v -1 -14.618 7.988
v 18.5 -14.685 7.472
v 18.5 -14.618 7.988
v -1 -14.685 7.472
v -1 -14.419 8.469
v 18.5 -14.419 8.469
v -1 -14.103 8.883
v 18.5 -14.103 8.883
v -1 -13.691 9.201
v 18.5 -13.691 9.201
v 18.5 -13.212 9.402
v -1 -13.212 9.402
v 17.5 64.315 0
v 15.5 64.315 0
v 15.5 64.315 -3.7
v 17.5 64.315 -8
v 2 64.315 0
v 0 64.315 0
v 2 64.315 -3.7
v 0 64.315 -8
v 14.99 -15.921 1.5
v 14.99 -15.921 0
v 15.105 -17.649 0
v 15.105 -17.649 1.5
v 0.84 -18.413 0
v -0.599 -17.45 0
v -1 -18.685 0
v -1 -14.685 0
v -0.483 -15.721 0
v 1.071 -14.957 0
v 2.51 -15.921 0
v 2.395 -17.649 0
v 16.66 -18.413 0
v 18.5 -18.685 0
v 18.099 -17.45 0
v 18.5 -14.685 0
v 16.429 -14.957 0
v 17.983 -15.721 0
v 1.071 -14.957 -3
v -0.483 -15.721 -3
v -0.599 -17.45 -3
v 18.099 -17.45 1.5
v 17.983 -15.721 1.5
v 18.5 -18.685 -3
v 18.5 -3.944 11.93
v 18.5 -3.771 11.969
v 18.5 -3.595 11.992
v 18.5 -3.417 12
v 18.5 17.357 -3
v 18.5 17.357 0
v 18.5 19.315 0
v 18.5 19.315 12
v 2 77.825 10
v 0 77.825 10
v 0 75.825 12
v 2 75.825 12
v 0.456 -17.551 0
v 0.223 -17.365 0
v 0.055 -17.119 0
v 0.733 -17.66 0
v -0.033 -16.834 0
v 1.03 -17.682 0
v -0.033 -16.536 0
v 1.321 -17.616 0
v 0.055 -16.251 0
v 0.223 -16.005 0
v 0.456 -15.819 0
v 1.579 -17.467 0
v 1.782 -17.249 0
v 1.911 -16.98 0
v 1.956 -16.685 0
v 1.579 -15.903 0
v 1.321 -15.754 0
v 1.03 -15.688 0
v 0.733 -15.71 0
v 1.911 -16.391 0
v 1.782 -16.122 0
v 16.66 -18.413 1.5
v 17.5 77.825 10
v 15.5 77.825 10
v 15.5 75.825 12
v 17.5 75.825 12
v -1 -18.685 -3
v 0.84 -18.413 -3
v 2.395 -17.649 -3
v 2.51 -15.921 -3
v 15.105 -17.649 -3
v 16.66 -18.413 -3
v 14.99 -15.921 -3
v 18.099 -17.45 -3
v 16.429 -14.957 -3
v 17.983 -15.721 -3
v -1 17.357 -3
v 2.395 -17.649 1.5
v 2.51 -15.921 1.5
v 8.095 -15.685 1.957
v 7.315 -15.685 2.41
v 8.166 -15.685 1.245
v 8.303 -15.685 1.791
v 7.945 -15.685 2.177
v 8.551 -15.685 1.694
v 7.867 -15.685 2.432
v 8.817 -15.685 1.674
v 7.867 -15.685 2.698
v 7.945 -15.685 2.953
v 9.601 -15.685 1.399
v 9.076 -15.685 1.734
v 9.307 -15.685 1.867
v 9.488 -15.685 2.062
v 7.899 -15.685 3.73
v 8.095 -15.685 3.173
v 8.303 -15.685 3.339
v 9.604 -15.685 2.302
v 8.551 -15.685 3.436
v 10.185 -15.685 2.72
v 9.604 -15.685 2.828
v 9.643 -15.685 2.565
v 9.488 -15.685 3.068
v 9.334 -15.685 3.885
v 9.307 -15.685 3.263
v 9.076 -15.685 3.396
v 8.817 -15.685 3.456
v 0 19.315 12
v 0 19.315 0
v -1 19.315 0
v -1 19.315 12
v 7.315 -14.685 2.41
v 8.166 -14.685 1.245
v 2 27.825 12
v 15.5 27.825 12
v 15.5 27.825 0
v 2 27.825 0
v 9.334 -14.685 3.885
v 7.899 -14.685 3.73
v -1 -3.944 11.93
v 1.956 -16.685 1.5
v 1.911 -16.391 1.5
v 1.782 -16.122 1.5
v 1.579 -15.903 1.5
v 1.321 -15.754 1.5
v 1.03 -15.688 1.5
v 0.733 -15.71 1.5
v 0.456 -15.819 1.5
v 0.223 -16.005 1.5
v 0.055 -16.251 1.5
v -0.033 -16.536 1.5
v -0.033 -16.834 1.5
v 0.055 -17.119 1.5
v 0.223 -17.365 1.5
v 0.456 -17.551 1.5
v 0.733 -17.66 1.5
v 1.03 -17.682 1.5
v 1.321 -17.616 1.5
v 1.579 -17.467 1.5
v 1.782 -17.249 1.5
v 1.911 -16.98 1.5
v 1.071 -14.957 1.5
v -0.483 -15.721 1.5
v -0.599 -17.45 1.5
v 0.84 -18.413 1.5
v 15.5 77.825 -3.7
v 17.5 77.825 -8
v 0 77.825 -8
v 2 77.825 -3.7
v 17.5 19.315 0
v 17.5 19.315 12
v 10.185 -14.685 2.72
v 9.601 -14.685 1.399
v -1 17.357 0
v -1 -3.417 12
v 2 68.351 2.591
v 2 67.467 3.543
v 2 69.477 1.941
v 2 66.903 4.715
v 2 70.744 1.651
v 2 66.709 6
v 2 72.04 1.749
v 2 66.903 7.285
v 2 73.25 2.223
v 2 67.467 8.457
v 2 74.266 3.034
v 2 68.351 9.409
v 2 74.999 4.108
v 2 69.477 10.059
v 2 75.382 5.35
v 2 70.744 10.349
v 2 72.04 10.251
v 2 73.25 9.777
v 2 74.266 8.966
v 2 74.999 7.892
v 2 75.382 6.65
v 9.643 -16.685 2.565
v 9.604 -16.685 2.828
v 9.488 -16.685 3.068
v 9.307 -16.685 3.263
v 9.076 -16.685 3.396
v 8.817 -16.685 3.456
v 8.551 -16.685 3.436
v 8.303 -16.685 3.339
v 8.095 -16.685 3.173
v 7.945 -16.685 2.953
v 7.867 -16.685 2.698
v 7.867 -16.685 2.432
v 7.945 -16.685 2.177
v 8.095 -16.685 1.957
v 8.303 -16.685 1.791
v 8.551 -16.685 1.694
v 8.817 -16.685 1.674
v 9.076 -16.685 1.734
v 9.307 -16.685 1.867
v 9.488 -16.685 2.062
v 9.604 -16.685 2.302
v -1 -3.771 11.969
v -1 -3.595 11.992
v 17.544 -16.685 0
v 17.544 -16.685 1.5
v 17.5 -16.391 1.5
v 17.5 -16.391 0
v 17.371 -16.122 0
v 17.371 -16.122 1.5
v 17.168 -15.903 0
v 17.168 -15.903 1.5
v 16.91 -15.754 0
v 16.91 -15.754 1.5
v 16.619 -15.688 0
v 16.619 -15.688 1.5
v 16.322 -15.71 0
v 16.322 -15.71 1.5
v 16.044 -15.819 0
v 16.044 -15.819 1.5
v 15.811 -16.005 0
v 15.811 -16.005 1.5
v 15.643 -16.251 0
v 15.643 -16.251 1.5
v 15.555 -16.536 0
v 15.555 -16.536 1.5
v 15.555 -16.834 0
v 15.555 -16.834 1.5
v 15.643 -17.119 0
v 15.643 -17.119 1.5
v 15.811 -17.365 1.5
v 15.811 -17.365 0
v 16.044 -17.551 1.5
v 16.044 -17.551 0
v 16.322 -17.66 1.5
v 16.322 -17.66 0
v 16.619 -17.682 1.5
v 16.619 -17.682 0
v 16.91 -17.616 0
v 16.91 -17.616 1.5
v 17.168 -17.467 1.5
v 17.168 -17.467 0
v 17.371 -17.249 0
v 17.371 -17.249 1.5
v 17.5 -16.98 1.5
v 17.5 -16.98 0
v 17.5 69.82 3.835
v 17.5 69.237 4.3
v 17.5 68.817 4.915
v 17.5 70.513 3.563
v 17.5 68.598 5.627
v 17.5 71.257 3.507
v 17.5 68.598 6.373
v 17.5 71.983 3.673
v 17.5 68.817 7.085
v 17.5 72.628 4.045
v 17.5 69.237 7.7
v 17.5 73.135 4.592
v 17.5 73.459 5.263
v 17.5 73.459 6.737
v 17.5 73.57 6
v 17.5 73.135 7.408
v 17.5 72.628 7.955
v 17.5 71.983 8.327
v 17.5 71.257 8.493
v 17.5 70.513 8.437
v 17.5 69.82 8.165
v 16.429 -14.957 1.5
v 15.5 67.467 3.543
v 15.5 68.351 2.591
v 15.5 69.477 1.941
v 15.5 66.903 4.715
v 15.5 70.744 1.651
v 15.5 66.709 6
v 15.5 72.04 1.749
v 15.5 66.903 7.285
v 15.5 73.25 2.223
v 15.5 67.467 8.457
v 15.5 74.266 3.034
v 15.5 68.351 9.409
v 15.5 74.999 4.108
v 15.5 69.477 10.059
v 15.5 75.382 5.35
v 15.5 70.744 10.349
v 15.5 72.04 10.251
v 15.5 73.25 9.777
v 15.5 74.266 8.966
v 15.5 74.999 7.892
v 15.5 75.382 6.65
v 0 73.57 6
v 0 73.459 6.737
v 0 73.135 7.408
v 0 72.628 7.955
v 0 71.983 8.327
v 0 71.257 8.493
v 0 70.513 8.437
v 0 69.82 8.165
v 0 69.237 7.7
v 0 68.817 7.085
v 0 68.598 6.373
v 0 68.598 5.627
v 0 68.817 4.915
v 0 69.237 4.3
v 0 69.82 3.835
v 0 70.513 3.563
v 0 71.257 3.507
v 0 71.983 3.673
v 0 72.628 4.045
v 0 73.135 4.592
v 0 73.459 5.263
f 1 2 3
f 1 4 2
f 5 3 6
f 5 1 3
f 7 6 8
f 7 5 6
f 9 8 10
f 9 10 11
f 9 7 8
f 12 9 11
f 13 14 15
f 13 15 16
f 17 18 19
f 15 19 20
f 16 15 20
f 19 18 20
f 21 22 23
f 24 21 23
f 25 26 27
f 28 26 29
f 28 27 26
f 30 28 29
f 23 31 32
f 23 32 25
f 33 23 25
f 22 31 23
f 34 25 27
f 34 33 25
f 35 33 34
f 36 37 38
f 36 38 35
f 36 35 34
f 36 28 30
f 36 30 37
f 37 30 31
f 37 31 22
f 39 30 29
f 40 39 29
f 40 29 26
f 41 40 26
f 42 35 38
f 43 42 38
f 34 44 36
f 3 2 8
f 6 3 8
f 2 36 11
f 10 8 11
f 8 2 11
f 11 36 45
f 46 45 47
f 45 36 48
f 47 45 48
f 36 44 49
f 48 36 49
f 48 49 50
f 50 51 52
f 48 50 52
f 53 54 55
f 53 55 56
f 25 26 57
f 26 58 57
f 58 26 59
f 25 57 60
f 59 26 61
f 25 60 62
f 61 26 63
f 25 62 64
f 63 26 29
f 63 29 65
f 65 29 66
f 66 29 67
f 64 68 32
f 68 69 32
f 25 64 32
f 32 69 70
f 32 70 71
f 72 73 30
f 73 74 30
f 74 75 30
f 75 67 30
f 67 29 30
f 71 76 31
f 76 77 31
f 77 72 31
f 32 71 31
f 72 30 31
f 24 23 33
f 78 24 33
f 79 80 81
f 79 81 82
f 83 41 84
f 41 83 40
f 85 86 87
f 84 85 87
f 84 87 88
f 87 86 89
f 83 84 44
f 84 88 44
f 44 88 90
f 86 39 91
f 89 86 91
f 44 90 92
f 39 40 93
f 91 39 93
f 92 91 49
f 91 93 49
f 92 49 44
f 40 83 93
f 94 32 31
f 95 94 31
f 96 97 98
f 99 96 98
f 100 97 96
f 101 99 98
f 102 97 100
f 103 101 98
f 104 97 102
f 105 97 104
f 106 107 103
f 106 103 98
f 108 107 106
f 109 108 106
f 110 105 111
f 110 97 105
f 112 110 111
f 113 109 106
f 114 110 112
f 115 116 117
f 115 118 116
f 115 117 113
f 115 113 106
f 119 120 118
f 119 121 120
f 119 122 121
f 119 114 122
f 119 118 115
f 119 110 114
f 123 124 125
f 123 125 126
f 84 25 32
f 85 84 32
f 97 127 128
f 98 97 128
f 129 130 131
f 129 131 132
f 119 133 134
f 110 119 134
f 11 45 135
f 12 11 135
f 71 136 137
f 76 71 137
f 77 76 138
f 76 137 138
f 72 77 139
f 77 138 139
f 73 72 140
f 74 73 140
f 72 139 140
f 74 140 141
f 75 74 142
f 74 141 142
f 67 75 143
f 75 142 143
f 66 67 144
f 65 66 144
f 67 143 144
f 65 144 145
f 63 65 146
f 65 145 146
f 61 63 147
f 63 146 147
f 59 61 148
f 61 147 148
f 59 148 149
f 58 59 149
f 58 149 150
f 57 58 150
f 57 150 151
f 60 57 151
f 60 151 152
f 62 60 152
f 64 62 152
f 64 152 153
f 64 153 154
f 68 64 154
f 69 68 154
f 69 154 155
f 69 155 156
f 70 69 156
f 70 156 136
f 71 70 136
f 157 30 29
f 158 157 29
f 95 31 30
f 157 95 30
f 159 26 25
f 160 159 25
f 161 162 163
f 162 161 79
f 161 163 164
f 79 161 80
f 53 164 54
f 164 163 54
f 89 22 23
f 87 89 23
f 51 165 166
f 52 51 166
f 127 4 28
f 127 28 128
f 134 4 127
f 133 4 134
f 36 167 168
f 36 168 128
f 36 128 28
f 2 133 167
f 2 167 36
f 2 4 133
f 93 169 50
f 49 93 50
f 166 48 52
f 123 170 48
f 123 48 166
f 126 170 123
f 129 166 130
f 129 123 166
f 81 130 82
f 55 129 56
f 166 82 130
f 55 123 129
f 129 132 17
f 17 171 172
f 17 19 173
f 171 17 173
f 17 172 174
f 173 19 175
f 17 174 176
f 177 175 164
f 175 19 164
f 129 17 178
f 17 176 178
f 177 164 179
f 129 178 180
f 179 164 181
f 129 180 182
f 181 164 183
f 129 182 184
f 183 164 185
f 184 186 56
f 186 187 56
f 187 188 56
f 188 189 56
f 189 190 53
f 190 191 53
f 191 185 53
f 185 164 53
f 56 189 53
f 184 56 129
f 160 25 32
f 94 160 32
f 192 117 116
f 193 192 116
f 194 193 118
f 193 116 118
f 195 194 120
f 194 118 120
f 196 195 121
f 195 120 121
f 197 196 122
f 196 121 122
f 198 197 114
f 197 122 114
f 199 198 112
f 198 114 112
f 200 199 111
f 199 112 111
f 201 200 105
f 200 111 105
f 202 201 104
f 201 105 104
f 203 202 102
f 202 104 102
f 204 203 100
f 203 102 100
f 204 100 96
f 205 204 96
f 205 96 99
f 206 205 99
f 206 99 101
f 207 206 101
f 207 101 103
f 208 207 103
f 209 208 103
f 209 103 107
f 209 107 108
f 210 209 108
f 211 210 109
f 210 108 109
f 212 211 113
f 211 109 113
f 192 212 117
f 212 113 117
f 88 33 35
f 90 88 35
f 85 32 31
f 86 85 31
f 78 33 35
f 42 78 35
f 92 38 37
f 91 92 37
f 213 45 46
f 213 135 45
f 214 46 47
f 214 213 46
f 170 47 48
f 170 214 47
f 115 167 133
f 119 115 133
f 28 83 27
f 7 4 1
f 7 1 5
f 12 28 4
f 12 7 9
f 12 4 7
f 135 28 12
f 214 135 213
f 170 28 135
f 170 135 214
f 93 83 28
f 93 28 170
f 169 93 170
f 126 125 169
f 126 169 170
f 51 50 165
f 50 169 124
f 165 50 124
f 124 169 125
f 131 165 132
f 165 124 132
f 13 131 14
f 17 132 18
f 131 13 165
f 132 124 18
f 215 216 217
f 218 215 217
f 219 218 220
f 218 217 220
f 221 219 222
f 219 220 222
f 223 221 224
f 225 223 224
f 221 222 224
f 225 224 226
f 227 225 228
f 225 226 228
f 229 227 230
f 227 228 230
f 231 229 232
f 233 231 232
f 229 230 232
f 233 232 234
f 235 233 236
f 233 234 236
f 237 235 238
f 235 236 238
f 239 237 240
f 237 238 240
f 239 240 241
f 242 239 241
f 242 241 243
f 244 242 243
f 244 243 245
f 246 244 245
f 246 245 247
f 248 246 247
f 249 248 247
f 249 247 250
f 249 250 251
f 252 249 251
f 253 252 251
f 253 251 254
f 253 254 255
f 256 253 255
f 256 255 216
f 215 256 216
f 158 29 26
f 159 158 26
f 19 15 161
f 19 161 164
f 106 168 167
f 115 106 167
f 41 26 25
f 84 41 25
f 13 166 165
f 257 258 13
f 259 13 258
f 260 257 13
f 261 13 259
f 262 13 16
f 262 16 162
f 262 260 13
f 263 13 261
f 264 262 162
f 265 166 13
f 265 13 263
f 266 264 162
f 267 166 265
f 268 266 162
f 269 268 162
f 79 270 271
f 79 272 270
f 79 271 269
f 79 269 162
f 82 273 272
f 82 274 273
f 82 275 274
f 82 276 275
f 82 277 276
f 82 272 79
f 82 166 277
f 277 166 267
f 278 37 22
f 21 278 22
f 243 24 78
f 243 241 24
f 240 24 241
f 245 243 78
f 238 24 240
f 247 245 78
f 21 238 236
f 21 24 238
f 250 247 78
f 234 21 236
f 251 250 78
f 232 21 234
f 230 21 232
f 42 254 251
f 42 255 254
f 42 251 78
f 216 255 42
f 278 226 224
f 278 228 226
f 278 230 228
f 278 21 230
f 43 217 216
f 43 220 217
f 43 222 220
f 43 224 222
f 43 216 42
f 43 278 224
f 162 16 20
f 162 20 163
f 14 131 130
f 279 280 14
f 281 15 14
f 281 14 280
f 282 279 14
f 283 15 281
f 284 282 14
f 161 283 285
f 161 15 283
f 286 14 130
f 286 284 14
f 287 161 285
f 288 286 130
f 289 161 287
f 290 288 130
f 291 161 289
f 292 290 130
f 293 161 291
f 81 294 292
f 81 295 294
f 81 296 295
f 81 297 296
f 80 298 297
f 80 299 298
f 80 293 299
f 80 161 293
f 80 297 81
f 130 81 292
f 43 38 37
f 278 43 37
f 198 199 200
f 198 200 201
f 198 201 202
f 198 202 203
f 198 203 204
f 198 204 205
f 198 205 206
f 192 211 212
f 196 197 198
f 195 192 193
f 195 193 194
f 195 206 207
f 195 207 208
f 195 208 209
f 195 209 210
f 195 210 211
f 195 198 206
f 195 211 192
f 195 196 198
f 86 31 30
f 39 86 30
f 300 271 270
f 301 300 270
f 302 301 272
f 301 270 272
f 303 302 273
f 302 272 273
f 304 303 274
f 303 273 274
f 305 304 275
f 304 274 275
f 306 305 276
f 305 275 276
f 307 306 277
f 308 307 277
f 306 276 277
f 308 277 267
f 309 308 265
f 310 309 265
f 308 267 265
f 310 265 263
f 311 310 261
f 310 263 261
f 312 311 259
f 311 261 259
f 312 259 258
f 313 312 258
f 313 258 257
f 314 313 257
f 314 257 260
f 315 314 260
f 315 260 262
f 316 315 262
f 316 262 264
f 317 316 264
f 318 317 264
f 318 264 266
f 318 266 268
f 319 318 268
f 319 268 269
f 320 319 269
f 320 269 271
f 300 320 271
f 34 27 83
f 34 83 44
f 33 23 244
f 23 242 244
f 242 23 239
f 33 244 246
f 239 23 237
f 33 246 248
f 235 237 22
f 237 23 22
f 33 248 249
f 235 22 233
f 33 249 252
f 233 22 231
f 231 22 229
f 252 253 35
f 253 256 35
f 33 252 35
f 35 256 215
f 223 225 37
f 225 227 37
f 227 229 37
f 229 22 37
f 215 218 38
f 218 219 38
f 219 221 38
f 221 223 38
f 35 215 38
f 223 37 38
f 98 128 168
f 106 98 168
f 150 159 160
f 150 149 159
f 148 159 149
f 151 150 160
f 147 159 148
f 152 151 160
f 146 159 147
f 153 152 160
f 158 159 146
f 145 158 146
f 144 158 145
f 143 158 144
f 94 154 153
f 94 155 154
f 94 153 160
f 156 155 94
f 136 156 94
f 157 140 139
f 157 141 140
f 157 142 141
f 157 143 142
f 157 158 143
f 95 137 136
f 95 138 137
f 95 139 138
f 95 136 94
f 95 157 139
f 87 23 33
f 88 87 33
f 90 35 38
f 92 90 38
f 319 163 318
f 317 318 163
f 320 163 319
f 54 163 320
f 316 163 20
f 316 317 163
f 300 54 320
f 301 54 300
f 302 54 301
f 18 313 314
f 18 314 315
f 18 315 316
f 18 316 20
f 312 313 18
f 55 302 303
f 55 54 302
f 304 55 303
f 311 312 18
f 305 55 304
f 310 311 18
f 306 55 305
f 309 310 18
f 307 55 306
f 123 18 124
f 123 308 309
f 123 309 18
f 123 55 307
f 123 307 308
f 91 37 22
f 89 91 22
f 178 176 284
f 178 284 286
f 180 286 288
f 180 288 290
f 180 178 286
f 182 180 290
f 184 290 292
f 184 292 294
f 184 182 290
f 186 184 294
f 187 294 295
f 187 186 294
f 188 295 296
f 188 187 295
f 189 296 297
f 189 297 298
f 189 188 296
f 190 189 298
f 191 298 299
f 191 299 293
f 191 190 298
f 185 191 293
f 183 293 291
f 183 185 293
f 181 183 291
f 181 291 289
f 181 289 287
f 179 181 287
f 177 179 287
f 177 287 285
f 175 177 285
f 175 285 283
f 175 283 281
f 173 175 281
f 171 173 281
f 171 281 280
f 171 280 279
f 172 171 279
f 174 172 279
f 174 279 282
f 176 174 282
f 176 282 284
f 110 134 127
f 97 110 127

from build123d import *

# Parameters (mm, degrees)
F1_DEPTH  = 17.5
F2_W      = 13.5
F2_H      = 15.7
F3_DEPTH  = 50
F4_W      = 34
F4_H      = 12
F5_DEPTH  = 1
F6_W      = 34
F6_H      = 12
F7_DEPTH  = 1
F8_SIZE2  = 11
F8_SIZE   = 3
F9_R      = 2
F10_SIZE  = 2
F11_R     = 4.3608060118
F12_DEPTH = 17
F13_R     = 2.5
F14_DEPTH = 25
F15_W     = 19.5
F15_H     = 32.0418726716
F16_DEPTH = 3
F17_W     = 19.5
F17_H     = 3
F18_DEPTH = 4
F20_DEPTH = 25
F22_DEPTH = 1
F23_R     = 0.8932085331
F24_DEPTH = 1
F25_DEPTH = 1.5
F26_R     = 1
F27_DEPTH = 25
F28_R     = 1
F29_DEPTH = 25


with BuildPart() as f1:
    # F0 (on Right) → F1 (new body)
    with BuildSketch(Plane.YZ):
        Polygon((-14.6852832351, 12), (-14.6852832351, 0), (64.3147167649, 0), (64.3147167649, -8), (77.8247167649, -8), (77.8247167649, 12), align=None)
    extrude(amount=F1_DEPTH)

    # F2 (on face) → F3 (cut)
    with BuildSketch(Plane(origin=(0, 77.8247167649, 0), x_dir=(-1, 0, 0), z_dir=(0, 1, 0))):
        with Locations((-8.75, 4.15)):
            Rectangle(F2_W, F2_H)
    extrude(amount=-F3_DEPTH, mode=Mode.SUBTRACT)

    # F4 (on face) → F5 (join)
    with BuildSketch(Plane(origin=(0, 0, 0), x_dir=(0, -1, 0), z_dir=(-1, 0, 0))):
        with Locations((-2.3147167649, 6)):
            Rectangle(F4_W, F4_H)
    extrude(amount=F5_DEPTH)

    # F6 (on face) → F7 (join)
    with BuildSketch(Plane.YZ.offset(17.5)):
        with Locations((2.3147167649, 6)):
            Rectangle(F6_W, F6_H)
    extrude(amount=F7_DEPTH)

    # F8
    f8_edges = [f1.edges().sort_by_distance(p)[0] for p in [
        (8.75, -14.685283, 12),
    ]]
    f8_side = f1.faces().sort_by_distance((8.75, -14.685283, 6))[0]
    chamfer(f8_edges, length=F8_SIZE, length2=F8_SIZE2, reference=f8_side)

    # F9
    f9_edges = [f1.edges().sort_by_distance(p)[0] for p in [
        (8.75, -3.685283, 12),
        (8.75, -14.685283, 9),
    ]]
    fillet(f9_edges, radius=F9_R)

    # F10
    f10_edges = [f1.edges().sort_by_distance(p)[0] for p in [
        (1, 77.824717, 12),
        (16.5, 77.824717, 12),
    ]]
    chamfer(f10_edges, length=F10_SIZE)

    # F11 (on face) → F12 (join)
    with BuildSketch(Plane(origin=(0, 0, 0), x_dir=(0, -1, 0), z_dir=(-1, 0, 0))):
        with Locations((-71.0697167649, 6)):
            Circle(F11_R)
    extrude(amount=-F12_DEPTH)

    # F13 (on face) → F14 (cut)
    with BuildSketch(Plane.YZ.offset(17.5)):
        with Locations((71.0697167649, 6)):
            Circle(F13_R)
    extrude(amount=-F14_DEPTH, mode=Mode.SUBTRACT)

    # F15 (on face) → F16 (join)
    with BuildSketch(Plane(origin=(0, 0, 0), x_dir=(1, 0, 0), z_dir=(0, 0, -1))):
        with Locations((8.75, -1.3356531007)):
            Rectangle(F15_W, F15_H)
    extrude(amount=F16_DEPTH)

    # F17 (on face) → F18 (join)
    with BuildSketch(Plane.XZ.offset(14.6852832351)):
        with Locations((8.75, -1.5)):
            Rectangle(F17_W, F17_H)
    extrude(amount=F18_DEPTH)

    # F19 (on face) → F20 (cut)
    with BuildSketch(Plane.XY):
        Polygon((16.659564737, -18.4134932892), (18.0985973966, -17.4495508612), (17.983315096, -15.7213408071), (16.4290001357, -14.9570731809), (14.9899674761, -15.921015609), (15.1052497767, -17.6492256631), align=None)
        Polygon((2.3947502233, -17.6492256631), (2.5100325239, -15.921015609), (1.0709998643, -14.9570731809), (-0.483315096, -15.7213408071), (-0.5985973966, -17.4495508612), (0.840435263, -18.4134932892), align=None)
    extrude(amount=-F20_DEPTH, mode=Mode.SUBTRACT)

    # F21 (on face) → F22 (join)
    with BuildSketch(Plane.XZ.offset(14.6852832351)):
        Polygon((7.8985828945, 3.7304804047), (7.314926952, 2.4103746991), (8.1663440575, 1.244860973), (9.6014171055, 1.3994529525), (10.185073048, 2.7195586581), (9.3336559425, 3.8850723843), align=None)
    extrude(amount=F22_DEPTH)

    # F23 (on face) → F24 (join)
    with BuildSketch(Plane.XZ.offset(15.6852832351)):
        with Locations((8.75, 2.5649666786)):
            Circle(F23_R)
    extrude(amount=F24_DEPTH)


with BuildPart() as f25:
    # F19 (on face) → F25 (new body)
    with BuildSketch(Plane.XY):
        Polygon((16.659564737, -18.4134932892), (18.0985973966, -17.4495508612), (17.983315096, -15.7213408071), (16.4290001357, -14.9570731809), (14.9899674761, -15.921015609), (15.1052497767, -17.6492256631), align=None)
    extrude(amount=F25_DEPTH)

    # F26 (on face) → F27 (cut)
    with BuildSketch(Plane.XY.offset(1.5)):
        with Locations((16.5442824364, -16.6852832351)):
            Circle(F26_R)
    extrude(amount=-F27_DEPTH, mode=Mode.SUBTRACT)


with BuildPart() as f25b:
    # F19 (on face) → F25, piece 2 (new body)
    with BuildSketch(Plane.XY):
        Polygon((2.3947502233, -17.6492256631), (2.5100325239, -15.921015609), (1.0709998643, -14.9570731809), (-0.483315096, -15.7213408071), (-0.5985973966, -17.4495508612), (0.840435263, -18.4134932892), align=None)
    extrude(amount=F25_DEPTH)

    # F28 (on face) → F29 (cut)
    with BuildSketch(Plane.XY.offset(1.5)):
        with Locations((0.9557175636, -16.6852832351)):
            Circle(F28_R)
    extrude(amount=-F29_DEPTH, mode=Mode.SUBTRACT)


solid = Compound([f1.part, f25.part, f25b.part])
